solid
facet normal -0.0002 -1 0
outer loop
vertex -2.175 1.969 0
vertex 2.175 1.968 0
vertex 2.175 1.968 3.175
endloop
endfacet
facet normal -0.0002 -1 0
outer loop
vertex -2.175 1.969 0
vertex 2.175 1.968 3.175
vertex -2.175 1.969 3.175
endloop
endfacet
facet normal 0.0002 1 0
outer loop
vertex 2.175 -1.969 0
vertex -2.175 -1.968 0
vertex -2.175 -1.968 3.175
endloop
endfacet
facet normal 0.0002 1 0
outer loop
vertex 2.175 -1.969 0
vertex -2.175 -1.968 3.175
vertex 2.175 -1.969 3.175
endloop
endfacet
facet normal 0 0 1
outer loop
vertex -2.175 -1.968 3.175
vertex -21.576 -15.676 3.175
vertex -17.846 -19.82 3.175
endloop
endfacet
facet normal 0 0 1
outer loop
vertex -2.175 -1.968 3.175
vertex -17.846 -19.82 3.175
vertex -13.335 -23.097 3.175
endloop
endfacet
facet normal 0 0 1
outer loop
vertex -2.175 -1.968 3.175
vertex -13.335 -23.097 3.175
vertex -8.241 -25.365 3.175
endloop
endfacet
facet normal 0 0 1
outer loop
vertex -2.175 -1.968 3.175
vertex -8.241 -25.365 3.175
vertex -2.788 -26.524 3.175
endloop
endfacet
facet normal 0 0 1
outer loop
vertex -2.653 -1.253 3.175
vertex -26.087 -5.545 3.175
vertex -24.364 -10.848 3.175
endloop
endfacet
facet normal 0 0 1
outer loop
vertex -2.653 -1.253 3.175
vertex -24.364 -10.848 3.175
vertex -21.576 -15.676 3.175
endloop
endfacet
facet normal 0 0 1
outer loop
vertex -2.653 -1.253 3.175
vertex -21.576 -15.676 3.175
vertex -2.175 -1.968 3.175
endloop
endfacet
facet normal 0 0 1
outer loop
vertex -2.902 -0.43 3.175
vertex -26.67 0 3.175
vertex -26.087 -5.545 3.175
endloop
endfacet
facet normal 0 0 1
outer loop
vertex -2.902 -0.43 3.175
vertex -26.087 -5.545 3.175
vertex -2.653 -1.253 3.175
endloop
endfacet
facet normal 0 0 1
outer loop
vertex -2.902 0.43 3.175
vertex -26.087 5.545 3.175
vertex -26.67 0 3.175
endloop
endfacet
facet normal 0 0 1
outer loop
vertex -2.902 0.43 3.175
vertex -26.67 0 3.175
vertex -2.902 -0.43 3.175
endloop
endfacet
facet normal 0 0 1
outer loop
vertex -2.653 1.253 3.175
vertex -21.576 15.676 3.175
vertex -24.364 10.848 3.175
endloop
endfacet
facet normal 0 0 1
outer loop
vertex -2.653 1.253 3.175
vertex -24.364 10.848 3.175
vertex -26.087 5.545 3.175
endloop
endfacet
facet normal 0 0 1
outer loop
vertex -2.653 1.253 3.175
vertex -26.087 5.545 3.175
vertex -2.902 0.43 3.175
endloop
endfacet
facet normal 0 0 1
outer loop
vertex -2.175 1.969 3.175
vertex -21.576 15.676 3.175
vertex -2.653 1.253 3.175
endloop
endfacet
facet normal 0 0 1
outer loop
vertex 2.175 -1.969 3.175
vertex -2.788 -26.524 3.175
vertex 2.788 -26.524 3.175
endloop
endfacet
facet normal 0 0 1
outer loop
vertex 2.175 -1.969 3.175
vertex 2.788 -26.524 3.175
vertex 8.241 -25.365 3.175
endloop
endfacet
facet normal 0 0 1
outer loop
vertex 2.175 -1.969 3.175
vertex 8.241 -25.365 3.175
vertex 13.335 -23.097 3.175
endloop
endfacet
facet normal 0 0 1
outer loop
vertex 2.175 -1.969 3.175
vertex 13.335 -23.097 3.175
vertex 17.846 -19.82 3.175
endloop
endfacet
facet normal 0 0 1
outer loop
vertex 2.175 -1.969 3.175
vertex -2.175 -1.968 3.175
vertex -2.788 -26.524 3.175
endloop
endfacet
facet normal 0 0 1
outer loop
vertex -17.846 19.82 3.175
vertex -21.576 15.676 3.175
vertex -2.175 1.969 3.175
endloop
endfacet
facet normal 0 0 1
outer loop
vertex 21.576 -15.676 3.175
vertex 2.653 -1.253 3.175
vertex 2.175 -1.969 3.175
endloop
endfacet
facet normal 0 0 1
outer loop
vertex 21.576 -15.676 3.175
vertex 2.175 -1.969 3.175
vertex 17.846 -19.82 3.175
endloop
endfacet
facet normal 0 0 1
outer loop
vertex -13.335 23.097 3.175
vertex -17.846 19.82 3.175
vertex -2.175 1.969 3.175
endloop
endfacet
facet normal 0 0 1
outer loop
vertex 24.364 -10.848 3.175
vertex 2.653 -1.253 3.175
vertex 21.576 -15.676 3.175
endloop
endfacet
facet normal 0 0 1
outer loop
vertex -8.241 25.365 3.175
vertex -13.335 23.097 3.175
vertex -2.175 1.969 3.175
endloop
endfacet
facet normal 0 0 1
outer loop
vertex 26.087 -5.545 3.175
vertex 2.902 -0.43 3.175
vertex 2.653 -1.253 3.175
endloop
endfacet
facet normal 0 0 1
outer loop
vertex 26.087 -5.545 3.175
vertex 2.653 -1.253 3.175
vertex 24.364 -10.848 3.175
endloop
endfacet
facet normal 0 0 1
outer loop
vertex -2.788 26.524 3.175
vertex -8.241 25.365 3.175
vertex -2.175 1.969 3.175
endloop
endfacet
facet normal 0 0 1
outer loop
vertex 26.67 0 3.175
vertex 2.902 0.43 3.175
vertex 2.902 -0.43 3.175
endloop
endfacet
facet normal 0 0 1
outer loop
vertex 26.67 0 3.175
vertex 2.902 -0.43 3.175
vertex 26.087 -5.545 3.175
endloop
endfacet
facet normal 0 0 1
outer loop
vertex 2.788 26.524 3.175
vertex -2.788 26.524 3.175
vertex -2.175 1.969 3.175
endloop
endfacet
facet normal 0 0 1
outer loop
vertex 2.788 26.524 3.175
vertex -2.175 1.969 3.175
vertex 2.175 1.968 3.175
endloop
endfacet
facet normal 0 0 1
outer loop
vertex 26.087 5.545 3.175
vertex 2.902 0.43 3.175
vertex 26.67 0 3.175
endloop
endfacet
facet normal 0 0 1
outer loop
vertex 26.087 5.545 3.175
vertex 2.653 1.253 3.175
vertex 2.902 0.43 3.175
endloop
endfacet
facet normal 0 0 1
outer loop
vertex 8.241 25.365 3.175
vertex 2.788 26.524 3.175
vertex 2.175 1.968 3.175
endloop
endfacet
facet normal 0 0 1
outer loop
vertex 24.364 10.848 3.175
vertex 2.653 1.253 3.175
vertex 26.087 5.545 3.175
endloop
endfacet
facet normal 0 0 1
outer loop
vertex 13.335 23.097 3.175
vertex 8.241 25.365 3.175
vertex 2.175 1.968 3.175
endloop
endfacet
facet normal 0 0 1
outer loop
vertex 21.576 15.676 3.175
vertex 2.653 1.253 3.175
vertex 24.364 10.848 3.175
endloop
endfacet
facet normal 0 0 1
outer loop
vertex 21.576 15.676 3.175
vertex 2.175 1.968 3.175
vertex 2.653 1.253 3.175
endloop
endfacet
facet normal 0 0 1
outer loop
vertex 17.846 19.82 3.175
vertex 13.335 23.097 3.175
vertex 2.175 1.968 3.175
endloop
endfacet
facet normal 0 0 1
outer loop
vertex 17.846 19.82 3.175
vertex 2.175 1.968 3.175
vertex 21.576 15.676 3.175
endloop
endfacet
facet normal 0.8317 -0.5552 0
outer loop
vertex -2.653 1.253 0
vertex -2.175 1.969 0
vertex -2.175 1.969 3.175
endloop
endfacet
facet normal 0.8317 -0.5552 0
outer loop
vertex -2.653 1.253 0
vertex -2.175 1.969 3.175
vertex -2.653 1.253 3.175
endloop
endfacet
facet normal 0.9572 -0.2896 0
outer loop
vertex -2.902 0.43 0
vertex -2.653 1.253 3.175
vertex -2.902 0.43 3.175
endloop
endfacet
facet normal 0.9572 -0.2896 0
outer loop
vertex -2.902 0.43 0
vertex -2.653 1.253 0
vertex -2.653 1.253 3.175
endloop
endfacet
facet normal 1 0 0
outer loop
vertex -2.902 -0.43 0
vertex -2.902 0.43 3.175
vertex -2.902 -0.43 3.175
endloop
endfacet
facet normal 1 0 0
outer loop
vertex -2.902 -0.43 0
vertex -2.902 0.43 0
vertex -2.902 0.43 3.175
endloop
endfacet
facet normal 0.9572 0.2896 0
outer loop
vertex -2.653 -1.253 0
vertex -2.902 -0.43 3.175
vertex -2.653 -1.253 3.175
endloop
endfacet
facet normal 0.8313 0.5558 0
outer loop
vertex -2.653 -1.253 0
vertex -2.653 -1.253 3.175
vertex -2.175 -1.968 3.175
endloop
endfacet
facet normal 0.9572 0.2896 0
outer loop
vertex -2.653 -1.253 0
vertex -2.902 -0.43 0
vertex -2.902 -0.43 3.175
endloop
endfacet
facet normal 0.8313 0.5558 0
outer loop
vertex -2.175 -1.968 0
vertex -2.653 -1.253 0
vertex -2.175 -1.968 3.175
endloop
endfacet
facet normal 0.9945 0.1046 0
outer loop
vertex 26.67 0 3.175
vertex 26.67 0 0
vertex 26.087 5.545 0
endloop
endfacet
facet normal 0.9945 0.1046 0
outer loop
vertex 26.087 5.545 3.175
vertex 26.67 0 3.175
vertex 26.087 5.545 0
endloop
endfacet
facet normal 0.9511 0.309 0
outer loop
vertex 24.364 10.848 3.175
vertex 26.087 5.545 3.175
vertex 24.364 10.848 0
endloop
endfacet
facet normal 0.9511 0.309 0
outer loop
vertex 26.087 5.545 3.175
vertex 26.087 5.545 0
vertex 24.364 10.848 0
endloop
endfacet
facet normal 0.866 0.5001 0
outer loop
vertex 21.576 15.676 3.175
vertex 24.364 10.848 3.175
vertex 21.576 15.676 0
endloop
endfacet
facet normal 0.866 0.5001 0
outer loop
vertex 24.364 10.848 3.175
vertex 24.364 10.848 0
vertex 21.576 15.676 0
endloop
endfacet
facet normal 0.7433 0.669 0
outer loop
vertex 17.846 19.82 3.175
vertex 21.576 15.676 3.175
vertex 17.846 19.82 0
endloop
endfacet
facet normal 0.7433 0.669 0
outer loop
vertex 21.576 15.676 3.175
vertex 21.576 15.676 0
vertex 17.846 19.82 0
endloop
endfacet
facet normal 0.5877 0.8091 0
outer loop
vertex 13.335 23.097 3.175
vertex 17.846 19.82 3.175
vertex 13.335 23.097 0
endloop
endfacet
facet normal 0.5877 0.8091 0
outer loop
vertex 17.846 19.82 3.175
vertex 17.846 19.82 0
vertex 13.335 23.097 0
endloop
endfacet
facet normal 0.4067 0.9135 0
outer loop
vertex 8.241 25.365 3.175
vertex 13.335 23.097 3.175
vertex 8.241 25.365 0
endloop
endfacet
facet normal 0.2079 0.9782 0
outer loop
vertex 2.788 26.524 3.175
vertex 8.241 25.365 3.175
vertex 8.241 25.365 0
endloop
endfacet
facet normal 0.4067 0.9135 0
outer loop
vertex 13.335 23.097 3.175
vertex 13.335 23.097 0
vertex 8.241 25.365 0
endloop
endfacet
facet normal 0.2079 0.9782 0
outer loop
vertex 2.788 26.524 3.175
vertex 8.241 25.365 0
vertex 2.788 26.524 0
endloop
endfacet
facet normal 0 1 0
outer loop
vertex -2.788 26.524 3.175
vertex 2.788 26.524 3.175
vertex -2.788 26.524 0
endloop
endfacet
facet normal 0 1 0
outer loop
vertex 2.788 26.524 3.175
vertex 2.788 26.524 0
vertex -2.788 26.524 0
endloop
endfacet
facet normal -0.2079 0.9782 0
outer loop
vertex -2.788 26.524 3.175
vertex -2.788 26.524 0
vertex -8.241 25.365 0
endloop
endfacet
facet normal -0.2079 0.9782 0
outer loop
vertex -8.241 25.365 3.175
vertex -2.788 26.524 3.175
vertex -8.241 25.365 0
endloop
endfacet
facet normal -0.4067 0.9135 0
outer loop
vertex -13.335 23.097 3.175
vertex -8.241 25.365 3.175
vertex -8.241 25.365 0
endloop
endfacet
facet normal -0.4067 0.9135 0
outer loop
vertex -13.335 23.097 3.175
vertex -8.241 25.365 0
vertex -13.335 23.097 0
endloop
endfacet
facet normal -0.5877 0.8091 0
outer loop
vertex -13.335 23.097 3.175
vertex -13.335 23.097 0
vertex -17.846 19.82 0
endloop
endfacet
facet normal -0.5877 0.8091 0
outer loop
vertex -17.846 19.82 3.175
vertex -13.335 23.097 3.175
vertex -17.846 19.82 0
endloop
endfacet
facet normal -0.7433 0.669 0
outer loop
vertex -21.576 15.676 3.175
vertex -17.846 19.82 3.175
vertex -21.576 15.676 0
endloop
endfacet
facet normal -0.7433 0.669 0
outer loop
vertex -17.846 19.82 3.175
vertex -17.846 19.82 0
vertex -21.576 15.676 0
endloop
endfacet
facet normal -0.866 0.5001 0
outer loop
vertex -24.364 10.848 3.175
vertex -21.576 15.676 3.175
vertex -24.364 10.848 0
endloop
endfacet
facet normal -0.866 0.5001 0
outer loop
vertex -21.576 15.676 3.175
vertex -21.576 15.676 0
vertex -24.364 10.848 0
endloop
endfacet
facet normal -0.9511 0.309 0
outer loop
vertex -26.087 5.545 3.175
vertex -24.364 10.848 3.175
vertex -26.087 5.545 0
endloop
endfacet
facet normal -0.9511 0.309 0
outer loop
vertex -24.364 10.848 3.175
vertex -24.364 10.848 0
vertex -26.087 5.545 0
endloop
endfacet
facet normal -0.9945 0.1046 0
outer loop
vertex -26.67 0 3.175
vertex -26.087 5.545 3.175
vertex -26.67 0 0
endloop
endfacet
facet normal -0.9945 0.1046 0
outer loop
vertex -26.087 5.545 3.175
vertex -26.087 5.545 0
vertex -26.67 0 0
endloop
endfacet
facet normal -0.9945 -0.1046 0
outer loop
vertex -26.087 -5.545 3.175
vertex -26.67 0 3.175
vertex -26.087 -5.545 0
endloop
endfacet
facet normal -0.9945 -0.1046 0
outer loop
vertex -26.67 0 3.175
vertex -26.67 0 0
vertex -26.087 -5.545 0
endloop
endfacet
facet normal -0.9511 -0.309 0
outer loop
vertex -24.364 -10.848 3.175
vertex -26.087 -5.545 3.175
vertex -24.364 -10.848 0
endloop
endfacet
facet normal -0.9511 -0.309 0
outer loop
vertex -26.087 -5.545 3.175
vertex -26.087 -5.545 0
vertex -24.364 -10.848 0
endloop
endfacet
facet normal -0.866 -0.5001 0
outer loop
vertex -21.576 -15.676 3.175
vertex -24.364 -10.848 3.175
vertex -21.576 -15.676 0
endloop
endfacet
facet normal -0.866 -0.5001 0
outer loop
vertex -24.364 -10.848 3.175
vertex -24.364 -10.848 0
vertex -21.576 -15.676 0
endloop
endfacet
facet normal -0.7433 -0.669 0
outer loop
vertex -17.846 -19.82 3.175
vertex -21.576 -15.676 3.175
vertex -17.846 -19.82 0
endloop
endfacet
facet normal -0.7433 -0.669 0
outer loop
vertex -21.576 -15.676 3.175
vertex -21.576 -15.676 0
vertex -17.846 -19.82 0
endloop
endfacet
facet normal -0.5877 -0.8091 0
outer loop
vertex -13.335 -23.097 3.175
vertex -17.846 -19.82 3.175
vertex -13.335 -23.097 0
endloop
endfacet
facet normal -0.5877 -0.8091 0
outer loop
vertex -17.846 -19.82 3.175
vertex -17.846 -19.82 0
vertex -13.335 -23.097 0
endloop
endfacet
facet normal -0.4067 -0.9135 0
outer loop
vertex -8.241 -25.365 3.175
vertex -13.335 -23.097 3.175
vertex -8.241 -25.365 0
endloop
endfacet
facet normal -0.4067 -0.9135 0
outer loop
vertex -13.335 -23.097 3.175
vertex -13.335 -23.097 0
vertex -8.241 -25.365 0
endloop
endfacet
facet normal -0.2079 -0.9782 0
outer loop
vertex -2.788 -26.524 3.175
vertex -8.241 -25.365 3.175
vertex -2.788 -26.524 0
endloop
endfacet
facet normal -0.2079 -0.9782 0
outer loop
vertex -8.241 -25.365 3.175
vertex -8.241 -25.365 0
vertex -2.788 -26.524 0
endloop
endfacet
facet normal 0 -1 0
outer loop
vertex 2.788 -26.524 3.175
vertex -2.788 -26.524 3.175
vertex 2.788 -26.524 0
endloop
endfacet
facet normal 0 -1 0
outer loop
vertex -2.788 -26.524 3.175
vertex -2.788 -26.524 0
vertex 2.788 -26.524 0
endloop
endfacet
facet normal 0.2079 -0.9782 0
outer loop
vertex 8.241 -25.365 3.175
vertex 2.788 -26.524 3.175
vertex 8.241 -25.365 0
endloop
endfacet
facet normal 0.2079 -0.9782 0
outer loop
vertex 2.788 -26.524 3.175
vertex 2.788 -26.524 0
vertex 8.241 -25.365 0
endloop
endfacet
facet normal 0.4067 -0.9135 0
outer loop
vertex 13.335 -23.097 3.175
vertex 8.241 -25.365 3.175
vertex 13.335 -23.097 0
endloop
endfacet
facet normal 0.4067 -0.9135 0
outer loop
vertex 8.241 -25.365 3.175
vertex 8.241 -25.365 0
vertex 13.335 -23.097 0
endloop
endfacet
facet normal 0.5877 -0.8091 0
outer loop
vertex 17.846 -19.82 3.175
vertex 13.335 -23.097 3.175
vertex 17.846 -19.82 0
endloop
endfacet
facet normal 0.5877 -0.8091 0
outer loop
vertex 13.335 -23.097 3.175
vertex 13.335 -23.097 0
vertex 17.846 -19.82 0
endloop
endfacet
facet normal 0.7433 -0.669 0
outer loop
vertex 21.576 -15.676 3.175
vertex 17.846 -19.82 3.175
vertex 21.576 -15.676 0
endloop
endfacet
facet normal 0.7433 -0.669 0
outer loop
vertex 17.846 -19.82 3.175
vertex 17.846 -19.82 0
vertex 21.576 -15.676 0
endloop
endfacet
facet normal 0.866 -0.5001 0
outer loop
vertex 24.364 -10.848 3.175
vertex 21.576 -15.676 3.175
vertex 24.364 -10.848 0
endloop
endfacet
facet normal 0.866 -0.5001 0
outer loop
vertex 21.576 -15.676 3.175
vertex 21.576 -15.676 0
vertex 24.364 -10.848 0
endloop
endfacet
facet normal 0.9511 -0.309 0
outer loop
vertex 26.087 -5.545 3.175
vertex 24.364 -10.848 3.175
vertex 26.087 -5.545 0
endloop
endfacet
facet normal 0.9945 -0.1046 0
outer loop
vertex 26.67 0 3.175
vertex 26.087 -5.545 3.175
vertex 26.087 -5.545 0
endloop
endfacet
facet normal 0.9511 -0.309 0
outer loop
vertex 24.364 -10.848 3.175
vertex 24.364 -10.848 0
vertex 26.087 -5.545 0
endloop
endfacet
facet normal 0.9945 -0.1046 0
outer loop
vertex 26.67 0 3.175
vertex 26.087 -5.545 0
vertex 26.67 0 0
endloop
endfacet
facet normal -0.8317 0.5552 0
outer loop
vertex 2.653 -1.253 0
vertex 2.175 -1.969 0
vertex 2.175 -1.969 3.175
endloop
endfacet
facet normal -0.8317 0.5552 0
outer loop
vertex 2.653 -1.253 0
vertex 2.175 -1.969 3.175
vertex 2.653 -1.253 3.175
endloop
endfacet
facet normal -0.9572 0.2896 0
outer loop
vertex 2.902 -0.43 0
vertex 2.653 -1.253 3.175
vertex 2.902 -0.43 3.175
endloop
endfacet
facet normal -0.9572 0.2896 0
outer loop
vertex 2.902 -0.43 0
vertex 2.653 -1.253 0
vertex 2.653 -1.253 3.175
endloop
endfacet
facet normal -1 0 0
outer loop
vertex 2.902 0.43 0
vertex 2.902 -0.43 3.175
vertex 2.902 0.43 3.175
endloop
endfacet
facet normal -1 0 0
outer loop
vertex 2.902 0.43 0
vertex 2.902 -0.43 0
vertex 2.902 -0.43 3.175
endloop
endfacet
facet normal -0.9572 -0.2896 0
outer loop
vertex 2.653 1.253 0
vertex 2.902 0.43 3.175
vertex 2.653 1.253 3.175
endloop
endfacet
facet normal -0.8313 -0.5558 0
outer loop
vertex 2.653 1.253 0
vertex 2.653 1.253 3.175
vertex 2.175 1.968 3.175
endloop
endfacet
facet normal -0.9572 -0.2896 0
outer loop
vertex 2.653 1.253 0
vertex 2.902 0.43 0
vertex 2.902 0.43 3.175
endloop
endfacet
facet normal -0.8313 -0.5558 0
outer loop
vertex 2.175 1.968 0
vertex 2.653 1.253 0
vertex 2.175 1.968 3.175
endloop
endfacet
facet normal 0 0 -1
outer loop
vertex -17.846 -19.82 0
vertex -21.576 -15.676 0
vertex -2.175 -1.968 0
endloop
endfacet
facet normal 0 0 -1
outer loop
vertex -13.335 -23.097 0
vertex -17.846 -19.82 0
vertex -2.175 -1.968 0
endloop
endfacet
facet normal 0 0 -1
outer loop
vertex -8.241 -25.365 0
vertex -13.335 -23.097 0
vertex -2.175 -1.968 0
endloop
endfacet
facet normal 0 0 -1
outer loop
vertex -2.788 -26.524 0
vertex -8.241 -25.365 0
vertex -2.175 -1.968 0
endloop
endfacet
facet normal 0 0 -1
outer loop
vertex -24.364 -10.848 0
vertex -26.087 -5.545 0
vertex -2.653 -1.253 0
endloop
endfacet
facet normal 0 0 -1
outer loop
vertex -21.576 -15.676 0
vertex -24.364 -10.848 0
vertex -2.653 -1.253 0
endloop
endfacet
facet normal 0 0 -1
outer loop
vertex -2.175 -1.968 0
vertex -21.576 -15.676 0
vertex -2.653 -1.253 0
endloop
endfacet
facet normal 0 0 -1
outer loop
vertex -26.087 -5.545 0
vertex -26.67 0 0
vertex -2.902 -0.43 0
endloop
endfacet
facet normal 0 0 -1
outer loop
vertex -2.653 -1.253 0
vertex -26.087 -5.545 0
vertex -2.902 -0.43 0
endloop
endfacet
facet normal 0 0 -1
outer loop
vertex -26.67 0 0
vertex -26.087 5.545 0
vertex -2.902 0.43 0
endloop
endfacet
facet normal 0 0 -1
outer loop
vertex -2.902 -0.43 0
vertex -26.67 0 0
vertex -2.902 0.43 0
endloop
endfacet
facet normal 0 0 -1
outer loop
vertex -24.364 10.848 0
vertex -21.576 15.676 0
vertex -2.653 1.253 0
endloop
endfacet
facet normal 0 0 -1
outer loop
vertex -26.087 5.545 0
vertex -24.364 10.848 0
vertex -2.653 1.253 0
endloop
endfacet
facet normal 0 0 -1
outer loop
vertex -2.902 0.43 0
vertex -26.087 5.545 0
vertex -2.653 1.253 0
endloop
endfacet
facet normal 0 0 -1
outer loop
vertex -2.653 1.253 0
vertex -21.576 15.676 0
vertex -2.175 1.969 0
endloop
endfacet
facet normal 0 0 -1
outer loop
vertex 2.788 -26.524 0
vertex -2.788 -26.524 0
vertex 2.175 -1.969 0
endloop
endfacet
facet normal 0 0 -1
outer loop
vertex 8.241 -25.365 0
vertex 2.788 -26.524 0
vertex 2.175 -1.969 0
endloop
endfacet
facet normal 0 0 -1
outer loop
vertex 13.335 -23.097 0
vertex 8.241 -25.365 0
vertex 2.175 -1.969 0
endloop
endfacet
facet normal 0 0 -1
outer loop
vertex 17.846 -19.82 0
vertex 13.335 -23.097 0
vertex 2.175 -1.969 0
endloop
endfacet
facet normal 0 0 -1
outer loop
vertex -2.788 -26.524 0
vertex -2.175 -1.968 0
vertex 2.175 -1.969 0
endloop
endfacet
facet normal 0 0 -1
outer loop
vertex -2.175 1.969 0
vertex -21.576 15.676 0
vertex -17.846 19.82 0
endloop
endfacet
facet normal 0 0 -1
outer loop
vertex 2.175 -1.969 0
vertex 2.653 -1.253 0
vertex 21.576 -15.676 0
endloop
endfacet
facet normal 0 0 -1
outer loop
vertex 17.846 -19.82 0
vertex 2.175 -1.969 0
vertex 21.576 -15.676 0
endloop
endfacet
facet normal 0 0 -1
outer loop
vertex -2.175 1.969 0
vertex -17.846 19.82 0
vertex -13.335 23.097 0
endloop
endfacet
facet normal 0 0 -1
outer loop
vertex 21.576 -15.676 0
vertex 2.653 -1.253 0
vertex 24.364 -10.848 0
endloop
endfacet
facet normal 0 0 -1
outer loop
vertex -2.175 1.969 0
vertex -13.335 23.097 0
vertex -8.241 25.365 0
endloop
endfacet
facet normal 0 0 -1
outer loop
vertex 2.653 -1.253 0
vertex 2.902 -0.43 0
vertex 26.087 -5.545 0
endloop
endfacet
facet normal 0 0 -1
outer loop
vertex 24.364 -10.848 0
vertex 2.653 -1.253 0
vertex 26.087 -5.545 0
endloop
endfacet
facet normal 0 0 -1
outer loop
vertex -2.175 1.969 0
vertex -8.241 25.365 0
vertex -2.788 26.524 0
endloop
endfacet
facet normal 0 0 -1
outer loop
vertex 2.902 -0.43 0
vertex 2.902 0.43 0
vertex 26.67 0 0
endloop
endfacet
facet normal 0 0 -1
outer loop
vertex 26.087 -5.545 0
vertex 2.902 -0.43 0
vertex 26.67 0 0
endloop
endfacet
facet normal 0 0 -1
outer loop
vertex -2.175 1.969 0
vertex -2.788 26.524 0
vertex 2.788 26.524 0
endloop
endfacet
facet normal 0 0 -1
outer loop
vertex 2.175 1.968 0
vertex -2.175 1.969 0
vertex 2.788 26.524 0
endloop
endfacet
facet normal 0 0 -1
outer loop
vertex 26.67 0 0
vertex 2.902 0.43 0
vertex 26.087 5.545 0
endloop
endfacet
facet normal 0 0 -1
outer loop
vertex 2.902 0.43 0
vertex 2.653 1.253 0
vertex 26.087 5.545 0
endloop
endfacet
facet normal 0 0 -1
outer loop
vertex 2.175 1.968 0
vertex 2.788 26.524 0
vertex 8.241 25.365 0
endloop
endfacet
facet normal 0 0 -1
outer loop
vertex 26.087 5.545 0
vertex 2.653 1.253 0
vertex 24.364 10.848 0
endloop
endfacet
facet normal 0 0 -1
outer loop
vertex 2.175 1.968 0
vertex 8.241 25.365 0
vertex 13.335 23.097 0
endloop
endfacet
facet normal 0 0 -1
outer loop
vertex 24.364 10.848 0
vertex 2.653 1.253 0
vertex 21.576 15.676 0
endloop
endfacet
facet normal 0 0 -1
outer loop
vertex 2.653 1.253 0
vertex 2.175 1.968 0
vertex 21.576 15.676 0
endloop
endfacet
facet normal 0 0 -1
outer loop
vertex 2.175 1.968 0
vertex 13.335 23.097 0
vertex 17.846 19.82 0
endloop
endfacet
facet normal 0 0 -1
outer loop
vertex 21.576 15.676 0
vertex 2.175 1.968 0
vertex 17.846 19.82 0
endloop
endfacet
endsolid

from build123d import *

# Parameters (mm, degrees)
SKETCH1_R           = 26.67
BOSS_EXTRUDE1_DEPTH = 3.175


with BuildPart() as part:
    # Sketch1 → Boss-Extrude1 (new body)
    with BuildSketch(Plane.XY):
        Circle(SKETCH1_R)
        with BuildLine():
            ThreePointArc((-2.175224917, 1.9685), (-2.9337, 0), (-2.175224917, -1.9685))
            Line((-2.175224917, -1.9685), (2.175224917, -1.9685))
            ThreePointArc((2.175224917, -1.9685), (2.9337, 0), (2.175224917, 1.9685))
            Line((2.175224917, 1.9685), (-2.175224917, 1.9685))
        make_face(mode=Mode.SUBTRACT)
    extrude(amount=BOSS_EXTRUDE1_DEPTH)


solid = part.part
